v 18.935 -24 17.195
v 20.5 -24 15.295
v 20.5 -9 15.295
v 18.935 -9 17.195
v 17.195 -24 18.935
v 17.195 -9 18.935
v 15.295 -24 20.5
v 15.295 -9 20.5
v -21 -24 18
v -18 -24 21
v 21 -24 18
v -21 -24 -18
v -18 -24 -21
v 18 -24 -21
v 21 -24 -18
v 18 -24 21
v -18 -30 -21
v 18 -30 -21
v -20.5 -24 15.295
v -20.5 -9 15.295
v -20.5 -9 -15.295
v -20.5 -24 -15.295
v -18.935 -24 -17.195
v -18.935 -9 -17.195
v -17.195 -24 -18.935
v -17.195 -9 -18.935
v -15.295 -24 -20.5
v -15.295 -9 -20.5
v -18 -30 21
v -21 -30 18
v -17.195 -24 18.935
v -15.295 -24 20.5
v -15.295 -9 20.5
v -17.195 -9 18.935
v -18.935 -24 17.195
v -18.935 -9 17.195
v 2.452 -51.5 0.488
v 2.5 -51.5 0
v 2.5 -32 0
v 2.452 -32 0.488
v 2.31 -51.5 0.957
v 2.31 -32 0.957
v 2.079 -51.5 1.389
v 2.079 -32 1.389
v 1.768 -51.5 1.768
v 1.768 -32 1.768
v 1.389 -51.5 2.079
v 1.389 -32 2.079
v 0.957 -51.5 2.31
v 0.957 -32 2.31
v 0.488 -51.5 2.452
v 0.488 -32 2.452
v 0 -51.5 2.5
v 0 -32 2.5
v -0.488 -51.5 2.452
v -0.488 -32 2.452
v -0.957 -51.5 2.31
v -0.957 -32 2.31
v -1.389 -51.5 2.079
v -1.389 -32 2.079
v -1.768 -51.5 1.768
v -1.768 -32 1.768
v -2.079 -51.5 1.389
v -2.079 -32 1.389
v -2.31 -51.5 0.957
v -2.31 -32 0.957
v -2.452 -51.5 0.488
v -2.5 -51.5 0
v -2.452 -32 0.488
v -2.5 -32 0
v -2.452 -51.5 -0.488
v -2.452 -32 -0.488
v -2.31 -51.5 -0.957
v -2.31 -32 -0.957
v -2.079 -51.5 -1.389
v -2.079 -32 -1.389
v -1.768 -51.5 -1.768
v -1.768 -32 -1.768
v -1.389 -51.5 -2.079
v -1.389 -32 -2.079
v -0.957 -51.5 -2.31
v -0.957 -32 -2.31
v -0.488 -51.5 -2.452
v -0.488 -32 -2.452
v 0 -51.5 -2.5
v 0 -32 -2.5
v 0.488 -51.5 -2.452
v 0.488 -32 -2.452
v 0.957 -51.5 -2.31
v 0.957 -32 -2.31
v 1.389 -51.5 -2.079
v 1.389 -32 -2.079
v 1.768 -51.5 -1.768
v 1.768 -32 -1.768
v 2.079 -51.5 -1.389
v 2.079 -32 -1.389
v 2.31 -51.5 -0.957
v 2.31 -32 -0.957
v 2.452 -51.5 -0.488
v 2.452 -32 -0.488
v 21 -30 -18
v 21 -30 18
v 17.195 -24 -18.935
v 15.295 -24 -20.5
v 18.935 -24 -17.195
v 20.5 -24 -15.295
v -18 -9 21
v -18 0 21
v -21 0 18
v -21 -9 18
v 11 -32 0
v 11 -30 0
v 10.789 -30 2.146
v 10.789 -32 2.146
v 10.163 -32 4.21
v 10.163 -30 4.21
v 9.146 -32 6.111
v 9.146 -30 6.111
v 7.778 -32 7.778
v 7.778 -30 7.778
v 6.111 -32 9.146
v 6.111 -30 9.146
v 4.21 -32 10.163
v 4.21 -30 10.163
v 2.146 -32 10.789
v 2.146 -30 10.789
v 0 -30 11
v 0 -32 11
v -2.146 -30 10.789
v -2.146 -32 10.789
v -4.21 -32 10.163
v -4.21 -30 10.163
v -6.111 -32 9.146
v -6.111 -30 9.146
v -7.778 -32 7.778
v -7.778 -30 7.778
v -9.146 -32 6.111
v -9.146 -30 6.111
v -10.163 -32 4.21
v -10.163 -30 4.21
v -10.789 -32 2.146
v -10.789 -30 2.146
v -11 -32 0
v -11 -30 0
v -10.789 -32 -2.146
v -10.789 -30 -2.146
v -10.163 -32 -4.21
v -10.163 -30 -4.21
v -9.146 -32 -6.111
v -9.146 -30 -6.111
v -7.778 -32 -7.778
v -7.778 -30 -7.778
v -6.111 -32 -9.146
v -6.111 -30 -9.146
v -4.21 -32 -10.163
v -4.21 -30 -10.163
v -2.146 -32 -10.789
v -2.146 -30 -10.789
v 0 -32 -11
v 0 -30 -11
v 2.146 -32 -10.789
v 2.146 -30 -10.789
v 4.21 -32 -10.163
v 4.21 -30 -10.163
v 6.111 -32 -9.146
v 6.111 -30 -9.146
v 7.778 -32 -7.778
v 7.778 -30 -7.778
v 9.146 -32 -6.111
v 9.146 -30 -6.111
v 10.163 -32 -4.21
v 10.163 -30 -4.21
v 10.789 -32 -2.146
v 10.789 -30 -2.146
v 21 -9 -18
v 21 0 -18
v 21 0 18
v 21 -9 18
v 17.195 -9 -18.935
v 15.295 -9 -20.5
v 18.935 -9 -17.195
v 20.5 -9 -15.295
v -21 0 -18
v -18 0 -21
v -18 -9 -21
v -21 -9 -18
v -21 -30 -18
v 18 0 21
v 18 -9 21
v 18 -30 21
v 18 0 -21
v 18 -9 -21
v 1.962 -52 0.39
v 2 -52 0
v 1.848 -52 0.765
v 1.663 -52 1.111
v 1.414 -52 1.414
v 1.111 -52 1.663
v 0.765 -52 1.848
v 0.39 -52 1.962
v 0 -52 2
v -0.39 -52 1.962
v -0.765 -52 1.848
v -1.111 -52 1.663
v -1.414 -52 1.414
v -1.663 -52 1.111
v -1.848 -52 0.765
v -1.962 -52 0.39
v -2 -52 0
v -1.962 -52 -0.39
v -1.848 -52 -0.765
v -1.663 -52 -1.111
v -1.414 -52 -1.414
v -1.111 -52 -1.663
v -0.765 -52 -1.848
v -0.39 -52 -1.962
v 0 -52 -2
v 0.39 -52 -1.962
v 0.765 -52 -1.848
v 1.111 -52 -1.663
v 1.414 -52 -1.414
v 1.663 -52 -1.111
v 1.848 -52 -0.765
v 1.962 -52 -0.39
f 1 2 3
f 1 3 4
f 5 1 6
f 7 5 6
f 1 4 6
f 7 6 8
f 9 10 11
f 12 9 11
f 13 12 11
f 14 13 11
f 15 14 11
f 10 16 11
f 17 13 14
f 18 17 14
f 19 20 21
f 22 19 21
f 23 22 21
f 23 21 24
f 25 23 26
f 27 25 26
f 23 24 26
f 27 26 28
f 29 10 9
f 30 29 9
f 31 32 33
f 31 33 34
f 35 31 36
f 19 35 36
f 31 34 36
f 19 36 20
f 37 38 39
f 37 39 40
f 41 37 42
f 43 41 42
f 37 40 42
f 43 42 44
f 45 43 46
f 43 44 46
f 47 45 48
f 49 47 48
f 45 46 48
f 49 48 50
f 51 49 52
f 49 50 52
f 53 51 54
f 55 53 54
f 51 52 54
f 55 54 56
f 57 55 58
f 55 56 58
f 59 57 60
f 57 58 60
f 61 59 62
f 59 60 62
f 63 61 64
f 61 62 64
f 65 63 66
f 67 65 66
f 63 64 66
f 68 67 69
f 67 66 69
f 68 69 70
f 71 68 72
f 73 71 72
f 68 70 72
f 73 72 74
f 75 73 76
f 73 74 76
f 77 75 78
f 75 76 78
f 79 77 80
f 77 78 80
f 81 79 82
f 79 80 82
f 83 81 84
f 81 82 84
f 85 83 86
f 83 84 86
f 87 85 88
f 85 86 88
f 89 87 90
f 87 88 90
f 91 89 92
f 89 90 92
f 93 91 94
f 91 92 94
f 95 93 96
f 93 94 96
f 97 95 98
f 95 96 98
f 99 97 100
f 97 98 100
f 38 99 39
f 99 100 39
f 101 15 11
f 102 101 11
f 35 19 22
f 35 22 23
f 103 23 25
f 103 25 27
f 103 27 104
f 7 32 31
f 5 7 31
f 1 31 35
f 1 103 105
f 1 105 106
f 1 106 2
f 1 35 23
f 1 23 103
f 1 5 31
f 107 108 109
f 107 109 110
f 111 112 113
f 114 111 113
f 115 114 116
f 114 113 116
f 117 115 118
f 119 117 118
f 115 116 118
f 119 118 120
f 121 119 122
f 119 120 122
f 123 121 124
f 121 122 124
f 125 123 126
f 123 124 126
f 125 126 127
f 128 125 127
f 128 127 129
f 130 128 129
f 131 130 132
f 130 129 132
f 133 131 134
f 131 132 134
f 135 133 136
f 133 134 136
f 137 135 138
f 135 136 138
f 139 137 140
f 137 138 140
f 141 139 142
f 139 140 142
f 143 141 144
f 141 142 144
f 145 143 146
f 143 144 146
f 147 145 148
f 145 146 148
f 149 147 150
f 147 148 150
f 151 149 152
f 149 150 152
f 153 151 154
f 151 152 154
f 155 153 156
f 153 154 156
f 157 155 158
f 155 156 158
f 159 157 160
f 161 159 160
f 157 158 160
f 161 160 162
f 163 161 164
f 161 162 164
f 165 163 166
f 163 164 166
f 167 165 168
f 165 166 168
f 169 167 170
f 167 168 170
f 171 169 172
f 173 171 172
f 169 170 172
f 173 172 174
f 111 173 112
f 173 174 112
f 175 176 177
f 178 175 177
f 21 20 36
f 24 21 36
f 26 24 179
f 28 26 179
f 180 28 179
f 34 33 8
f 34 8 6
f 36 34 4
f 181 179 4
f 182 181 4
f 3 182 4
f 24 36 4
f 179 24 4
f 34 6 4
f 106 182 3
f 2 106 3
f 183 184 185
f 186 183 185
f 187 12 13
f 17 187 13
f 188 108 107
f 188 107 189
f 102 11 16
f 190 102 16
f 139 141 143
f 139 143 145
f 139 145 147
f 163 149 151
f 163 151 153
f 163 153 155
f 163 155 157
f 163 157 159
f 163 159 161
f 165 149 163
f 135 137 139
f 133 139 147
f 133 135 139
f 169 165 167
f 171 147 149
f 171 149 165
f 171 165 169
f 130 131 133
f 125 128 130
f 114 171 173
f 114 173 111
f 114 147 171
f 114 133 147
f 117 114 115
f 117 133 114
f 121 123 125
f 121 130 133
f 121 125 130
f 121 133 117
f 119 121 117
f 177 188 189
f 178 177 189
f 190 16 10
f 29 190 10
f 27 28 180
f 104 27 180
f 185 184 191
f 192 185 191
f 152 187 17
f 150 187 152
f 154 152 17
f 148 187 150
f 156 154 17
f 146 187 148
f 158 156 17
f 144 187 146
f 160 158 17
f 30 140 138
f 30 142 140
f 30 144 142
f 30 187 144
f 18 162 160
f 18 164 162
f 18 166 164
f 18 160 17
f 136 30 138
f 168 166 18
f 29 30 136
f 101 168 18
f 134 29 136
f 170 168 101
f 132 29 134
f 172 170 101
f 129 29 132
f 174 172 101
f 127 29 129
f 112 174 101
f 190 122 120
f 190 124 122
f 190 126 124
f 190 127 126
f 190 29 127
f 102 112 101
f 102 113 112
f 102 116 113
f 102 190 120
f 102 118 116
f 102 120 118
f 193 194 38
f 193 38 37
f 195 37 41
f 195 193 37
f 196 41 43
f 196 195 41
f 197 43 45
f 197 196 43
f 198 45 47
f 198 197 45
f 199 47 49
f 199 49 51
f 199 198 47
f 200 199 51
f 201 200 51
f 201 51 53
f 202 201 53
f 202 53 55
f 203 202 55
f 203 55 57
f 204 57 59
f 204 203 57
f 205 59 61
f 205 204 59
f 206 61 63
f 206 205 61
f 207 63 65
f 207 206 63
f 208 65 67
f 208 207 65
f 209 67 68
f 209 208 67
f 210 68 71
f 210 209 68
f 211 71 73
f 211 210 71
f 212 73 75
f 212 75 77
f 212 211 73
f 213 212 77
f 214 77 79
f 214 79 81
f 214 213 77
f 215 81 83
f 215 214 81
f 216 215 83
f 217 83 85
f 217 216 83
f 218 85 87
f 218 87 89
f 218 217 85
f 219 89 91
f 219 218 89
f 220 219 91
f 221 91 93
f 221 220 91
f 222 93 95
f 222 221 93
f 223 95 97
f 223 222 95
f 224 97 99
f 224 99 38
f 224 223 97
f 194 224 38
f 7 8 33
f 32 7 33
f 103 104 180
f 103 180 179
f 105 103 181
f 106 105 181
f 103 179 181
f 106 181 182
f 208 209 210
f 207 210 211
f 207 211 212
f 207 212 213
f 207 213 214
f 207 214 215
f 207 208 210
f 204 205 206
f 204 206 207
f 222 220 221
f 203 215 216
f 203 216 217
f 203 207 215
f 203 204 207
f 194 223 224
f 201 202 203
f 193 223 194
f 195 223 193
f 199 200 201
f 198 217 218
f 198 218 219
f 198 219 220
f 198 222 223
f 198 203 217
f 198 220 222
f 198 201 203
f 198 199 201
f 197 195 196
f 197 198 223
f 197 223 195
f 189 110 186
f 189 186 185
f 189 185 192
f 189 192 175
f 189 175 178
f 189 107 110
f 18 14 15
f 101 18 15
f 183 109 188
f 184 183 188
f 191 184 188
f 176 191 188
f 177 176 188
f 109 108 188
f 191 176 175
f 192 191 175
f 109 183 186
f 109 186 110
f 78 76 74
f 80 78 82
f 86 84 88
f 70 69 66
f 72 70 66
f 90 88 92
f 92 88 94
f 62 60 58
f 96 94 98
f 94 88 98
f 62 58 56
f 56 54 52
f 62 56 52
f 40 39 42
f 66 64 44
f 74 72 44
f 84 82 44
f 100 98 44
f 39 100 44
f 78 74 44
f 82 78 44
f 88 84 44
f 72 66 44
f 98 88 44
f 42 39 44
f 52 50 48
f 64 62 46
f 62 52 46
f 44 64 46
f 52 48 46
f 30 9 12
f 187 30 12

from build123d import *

# Parameters (mm, degrees)
F0_W      = 42
F0_H      = 42
F1_DEPTH  = 9
F2_SIZE   = 3
F3_R      = 15
F4_DEPTH  = 15
F6_DEPTH  = 6
F7_R      = 11
F8_DEPTH  = 2
F9_R      = 2.5
F10_DEPTH = 20
F11_SIZE  = 0.5


with BuildPart() as f1:
    # F0 (on Front) → F1 (new body)
    with BuildSketch(Plane.XZ):
        Rectangle(F0_W, F0_H)
    extrude(amount=F1_DEPTH)

    # F2
    f2_edges = [f1.edges().sort_by_distance(p)[0] for p in [
        (-21, -4.5, 21),
        (21, -4.5, 21),
        (21, -4.5, -21),
        (-21, -4.5, -21),
    ]]
    chamfer(f2_edges, length=F2_SIZE)


with BuildPart() as f4:
    # F3 (on face) → F4 (new body)
    with BuildSketch(Plane.XZ.offset(9)):
        with BuildLine():
            Line((15.2951411283, 20.5), (-15.2951411283, 20.5))
            ThreePointArc((-15.2951411283, 20.5), (-18.0857864376, 18.0857864376), (-20.5, 15.2951411283))
            Line((-20.5, 15.2951411283), (-20.5, -15.2951411283))
            ThreePointArc((-20.5, -15.2951411283), (-18.0857864376, -18.0857864376), (-15.2951411283, -20.5))
            Line((-15.2951411283, -20.5), (15.2951411283, -20.5))
            ThreePointArc((15.2951411283, -20.5), (18.0857864376, -18.0857864376), (20.5, -15.2951411283))
            Line((20.5, -15.2951411283), (20.5, 15.2951411283))
            ThreePointArc((20.5, 15.2951411283), (18.0857864376, 18.0857864376), (15.2951411283, 20.5))
        make_face()
        Circle(F3_R, mode=Mode.SUBTRACT)
        Circle(F3_R)
    extrude(amount=F4_DEPTH)


with BuildPart() as f6:
    # F5 (on face) → F6 (new body)
    with BuildSketch(Plane.XZ.offset(24)):
        Polygon((-18, 21), (-21, 18), (-21, -18), (-18, -21), (18, -21), (21, -18), (21, 18), (18, 21), align=None)
    extrude(amount=F6_DEPTH)

    # F7 (on face) → F8 (join)
    with BuildSketch(Plane.XZ.offset(30)):
        Circle(F7_R)
    extrude(amount=F8_DEPTH)


with BuildPart() as f10:
    # F9 (on face) → F10 (new body)
    with BuildSketch(Plane.XZ.offset(32)):
        Circle(F9_R)
    extrude(amount=F10_DEPTH)

    # F11
    f11_edges = [f10.edges().sort_by_distance(p)[0] for p in [
        (-2.5, -52, 0),
    ]]
    chamfer(f11_edges, length=F11_SIZE)


solid = Compound([f1.part, f4.part, f6.part, f10.part])
